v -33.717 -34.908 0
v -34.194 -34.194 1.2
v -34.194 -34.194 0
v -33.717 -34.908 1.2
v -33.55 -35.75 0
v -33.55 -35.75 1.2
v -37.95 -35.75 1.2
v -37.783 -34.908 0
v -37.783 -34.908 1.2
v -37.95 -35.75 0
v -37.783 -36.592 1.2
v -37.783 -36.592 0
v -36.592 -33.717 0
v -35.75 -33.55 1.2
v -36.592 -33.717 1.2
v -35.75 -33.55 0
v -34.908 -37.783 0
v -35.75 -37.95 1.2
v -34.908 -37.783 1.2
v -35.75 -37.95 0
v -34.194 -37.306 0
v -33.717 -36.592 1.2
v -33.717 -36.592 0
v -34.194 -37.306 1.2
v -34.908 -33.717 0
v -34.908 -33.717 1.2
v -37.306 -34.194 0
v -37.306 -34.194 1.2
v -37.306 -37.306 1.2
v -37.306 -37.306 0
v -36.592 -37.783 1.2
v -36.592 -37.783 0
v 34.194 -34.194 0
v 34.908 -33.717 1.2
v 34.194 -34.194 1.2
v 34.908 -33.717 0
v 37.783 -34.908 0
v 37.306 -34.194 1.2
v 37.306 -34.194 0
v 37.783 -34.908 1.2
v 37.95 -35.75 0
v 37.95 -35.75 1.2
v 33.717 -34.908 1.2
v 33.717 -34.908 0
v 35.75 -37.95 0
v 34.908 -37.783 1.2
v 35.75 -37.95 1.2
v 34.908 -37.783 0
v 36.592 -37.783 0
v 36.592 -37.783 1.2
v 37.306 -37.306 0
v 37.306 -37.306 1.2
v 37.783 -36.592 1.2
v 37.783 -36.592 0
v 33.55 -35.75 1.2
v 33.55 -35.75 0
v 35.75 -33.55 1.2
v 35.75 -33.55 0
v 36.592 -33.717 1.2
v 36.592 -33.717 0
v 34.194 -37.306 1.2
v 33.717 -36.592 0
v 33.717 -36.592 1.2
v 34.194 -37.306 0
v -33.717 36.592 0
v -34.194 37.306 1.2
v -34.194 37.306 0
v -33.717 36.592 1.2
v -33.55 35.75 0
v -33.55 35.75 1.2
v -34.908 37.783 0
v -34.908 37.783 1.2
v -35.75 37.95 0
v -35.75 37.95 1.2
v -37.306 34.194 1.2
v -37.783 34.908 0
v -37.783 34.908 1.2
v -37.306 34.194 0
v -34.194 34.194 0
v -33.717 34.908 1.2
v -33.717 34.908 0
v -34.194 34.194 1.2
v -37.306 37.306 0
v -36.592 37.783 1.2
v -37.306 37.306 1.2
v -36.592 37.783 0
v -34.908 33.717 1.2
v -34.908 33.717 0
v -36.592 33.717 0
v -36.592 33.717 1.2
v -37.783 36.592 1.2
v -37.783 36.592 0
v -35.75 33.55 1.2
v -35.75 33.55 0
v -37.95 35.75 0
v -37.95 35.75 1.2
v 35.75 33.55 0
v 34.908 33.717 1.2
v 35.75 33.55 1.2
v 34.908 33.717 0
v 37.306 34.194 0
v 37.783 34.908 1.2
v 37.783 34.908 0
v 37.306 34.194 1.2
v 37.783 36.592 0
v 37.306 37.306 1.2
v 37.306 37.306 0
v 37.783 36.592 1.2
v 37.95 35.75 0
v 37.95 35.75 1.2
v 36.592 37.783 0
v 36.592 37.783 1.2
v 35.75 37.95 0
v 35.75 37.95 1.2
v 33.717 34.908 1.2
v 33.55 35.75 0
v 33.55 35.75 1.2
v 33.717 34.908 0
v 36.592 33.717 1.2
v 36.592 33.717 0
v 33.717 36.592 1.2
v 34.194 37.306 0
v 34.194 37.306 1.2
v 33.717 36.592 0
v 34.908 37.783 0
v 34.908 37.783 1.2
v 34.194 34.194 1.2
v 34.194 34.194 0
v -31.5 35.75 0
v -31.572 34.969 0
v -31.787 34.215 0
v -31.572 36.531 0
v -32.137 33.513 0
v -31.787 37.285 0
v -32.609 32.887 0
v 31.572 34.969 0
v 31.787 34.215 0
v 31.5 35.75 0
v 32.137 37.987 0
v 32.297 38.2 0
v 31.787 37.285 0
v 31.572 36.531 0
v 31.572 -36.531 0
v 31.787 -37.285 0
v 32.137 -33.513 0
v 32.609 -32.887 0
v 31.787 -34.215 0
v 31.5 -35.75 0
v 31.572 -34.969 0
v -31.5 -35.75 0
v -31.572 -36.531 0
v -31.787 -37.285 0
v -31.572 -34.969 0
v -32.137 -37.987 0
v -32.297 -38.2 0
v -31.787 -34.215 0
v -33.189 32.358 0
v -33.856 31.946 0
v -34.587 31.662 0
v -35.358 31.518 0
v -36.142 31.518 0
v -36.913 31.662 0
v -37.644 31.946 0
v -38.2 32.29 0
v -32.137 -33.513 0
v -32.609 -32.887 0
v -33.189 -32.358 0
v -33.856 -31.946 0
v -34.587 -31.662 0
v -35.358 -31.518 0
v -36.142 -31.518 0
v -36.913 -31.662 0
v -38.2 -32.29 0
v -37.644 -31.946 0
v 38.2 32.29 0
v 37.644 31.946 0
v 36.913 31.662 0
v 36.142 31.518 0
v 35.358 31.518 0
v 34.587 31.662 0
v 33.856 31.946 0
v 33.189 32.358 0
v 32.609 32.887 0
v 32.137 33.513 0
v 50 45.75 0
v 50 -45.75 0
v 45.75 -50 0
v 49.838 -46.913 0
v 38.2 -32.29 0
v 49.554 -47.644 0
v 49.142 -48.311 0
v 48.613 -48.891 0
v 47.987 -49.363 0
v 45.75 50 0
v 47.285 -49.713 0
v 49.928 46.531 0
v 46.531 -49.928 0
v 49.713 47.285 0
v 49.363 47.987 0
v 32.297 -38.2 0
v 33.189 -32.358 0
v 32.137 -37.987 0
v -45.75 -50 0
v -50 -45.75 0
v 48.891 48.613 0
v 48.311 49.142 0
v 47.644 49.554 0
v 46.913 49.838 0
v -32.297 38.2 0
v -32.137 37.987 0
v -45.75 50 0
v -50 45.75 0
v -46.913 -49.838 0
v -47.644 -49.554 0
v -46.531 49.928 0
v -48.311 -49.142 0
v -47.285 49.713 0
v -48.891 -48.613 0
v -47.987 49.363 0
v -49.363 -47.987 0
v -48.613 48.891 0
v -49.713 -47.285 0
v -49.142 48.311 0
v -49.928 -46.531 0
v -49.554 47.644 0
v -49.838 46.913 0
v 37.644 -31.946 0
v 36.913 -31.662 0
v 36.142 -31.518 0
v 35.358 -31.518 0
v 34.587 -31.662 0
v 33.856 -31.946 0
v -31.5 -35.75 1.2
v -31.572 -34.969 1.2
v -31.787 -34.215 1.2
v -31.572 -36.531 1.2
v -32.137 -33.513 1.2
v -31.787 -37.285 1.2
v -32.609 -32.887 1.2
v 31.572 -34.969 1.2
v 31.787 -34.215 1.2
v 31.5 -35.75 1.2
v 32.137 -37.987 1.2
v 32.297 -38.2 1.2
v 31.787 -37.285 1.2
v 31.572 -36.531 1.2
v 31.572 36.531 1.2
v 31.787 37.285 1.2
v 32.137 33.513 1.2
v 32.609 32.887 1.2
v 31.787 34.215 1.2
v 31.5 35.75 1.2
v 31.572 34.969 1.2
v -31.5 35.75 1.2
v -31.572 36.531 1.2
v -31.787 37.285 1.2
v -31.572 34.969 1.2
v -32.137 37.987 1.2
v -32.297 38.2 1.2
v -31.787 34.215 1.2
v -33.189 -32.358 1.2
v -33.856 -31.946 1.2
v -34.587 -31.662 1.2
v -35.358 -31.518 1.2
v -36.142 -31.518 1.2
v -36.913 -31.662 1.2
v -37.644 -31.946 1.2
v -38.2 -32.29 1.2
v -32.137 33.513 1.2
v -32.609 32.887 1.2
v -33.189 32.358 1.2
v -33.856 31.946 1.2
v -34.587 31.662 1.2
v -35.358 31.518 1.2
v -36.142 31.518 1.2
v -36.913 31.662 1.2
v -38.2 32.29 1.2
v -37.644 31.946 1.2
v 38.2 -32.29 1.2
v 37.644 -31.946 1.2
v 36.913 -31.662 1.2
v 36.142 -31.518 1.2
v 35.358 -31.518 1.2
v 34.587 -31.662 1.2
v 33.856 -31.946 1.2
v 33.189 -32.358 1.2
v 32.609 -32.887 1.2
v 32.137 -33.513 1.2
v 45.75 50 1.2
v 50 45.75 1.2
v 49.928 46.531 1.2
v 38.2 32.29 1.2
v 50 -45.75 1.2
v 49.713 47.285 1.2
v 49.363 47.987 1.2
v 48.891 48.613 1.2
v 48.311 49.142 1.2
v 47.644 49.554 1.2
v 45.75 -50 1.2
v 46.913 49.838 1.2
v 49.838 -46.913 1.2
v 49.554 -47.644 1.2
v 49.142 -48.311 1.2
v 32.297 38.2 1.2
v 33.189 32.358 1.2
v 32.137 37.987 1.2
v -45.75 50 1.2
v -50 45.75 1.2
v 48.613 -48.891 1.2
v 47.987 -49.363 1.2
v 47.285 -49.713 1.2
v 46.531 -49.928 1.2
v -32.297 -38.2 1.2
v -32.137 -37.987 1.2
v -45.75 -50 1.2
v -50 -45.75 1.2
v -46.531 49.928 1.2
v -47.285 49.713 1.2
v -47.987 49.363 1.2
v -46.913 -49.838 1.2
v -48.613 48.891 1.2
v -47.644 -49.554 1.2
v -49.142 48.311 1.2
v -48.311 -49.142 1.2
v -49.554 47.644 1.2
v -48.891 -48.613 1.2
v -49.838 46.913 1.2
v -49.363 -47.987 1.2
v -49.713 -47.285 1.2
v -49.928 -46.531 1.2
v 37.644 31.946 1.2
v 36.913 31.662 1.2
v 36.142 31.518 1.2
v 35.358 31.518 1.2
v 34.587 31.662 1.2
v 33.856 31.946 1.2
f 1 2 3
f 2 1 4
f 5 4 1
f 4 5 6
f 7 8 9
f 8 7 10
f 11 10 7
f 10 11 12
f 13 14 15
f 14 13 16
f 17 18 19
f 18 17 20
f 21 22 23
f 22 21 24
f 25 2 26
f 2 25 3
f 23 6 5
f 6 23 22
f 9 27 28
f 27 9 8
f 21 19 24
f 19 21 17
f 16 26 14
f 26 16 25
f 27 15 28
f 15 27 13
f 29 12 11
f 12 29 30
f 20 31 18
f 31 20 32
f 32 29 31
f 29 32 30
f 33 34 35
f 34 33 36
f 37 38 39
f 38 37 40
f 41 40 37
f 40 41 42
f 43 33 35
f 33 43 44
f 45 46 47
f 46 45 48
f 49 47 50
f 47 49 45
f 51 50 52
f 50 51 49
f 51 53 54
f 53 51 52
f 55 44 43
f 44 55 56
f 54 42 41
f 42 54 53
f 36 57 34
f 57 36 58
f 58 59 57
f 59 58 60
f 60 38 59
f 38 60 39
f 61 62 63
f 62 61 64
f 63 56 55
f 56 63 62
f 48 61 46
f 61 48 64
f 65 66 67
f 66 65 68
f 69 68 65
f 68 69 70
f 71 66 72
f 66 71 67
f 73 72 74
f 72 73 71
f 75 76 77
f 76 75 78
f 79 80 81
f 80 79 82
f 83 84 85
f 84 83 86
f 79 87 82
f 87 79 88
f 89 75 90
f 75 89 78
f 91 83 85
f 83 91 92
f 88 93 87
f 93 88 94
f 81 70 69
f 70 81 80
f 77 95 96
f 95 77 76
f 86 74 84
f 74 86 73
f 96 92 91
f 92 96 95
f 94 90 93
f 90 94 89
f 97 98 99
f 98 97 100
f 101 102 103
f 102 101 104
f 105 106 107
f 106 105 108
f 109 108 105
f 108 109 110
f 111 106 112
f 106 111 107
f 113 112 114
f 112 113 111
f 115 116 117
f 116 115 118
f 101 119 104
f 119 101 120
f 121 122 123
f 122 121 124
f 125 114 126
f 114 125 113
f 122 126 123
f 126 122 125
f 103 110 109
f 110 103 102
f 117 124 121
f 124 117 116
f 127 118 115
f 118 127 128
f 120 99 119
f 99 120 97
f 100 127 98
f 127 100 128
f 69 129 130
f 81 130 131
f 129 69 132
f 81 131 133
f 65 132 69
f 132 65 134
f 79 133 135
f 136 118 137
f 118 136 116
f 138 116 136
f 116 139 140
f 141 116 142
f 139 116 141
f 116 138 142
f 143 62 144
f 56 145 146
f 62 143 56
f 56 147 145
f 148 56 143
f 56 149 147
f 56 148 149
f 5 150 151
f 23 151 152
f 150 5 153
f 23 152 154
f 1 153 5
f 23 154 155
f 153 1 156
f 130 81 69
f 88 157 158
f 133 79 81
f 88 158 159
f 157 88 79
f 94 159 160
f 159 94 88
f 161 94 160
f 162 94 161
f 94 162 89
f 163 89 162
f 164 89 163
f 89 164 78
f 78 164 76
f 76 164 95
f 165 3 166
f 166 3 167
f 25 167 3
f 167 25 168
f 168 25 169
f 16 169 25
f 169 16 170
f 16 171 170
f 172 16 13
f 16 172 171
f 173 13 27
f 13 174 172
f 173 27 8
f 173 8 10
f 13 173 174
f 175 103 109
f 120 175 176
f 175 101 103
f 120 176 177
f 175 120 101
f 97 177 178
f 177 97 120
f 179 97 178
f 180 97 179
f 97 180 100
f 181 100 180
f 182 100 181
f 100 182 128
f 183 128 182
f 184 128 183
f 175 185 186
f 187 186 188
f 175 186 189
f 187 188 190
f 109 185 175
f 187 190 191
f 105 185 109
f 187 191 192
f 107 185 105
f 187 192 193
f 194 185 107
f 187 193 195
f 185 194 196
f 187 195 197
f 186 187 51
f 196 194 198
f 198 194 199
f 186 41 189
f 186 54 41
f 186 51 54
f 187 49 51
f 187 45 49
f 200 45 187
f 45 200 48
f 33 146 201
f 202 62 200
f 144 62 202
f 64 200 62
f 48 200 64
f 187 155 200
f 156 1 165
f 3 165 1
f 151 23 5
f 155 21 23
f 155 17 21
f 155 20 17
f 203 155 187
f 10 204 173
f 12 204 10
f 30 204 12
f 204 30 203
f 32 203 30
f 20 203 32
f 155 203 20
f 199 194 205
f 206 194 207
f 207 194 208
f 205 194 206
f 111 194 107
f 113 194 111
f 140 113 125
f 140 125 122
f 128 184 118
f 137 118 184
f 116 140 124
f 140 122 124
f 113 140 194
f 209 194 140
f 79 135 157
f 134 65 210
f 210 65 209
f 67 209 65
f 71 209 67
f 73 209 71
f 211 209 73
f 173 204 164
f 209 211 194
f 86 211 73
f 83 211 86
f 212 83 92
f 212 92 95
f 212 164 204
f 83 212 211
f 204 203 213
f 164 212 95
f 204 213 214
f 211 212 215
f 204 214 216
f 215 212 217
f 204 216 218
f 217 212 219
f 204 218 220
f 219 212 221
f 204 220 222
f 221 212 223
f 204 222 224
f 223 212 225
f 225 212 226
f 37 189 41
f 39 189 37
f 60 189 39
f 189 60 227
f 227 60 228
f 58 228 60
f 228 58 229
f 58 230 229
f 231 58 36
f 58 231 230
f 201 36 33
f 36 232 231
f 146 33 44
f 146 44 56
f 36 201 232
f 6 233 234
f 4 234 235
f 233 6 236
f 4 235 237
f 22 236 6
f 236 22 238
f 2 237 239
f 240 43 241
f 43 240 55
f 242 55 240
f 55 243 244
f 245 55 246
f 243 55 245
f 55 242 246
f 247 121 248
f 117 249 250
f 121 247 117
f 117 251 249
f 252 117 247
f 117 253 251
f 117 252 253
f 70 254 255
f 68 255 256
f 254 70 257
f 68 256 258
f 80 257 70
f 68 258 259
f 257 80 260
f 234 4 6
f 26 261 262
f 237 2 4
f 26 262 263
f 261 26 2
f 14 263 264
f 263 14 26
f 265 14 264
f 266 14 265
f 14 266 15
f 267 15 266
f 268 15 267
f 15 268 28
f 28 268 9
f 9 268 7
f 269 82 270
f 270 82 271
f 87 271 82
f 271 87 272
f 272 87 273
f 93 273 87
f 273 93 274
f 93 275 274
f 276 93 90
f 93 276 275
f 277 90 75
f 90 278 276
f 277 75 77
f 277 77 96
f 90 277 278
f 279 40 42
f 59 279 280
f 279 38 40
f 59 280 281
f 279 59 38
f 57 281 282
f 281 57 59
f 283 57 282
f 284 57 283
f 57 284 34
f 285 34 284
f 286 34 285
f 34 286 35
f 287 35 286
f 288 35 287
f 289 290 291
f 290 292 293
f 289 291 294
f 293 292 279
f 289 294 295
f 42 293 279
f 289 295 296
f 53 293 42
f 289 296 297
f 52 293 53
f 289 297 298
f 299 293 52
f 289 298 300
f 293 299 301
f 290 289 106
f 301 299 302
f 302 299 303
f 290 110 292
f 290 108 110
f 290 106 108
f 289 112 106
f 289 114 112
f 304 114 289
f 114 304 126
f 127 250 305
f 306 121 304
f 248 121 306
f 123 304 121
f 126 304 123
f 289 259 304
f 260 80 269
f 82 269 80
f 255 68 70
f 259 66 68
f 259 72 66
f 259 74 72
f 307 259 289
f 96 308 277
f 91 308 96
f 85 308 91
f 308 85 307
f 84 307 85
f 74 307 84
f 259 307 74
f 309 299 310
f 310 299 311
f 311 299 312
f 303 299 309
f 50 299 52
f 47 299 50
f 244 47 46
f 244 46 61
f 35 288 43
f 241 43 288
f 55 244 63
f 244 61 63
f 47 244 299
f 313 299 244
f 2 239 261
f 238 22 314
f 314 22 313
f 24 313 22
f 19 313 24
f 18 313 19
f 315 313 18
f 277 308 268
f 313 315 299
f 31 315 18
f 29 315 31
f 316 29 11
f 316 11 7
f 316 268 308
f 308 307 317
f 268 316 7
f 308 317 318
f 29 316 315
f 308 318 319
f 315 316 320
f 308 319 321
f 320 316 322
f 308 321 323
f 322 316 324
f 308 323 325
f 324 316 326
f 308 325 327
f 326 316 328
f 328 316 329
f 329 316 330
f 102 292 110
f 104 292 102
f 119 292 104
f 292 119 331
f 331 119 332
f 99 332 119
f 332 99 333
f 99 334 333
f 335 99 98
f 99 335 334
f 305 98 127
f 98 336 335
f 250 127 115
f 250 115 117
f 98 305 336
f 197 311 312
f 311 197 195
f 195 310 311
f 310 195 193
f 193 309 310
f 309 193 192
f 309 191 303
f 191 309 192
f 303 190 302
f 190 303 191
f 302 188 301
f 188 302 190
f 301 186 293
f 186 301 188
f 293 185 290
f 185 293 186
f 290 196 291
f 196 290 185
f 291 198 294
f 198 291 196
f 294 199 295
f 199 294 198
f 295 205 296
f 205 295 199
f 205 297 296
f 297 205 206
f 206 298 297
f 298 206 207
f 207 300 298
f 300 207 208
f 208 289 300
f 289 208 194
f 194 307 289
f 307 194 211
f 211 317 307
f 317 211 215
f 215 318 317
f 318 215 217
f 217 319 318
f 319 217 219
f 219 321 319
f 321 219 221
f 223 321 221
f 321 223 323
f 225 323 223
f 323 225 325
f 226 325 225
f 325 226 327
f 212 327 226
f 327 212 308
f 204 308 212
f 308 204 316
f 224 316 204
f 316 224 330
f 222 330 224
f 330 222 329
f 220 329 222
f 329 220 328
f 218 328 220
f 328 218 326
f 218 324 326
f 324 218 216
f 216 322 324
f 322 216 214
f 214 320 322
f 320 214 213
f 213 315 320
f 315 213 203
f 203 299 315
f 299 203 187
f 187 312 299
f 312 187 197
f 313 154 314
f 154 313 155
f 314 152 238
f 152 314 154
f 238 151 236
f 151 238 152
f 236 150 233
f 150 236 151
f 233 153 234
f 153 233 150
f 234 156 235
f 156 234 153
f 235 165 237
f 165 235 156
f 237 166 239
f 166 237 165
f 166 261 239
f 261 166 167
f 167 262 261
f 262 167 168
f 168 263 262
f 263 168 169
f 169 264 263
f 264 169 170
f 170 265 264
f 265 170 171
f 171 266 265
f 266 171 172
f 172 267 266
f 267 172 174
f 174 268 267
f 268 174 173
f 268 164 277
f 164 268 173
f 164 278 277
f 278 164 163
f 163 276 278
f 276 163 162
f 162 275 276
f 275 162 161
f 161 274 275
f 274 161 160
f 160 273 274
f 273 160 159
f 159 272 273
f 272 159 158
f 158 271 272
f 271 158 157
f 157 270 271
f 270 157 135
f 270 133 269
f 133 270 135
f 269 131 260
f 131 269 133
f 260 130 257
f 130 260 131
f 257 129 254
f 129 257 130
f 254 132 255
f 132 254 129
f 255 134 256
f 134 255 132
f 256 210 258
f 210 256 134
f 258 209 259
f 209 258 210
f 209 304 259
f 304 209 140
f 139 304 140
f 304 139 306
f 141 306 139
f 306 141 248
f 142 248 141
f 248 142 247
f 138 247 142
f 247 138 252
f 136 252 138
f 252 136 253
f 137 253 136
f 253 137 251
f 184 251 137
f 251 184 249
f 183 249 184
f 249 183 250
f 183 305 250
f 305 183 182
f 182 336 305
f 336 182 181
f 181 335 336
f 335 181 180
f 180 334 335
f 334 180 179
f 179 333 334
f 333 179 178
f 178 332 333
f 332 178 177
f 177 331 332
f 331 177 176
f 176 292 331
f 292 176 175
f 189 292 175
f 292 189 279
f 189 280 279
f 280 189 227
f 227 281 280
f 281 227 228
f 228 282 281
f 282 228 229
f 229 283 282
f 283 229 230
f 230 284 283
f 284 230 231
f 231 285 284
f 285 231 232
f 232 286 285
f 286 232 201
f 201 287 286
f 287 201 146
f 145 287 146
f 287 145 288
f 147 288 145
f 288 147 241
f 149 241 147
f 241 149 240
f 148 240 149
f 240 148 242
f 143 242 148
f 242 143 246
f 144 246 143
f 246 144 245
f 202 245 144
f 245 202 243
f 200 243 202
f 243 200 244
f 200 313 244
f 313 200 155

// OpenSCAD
/*
 * Customizable Fan Cover - https://www.thingiverse.com/thing:2802474
 * by Dennis Hofmann - https://www.thingiverse.com/mightynozzle/about
 * created 2018-02-22
 * updated 2018-03-27
 * version v1.2
 *
 * Changelog
 * --------------
 * v1.2:
 *      - better quality of rounded corners and crosshair pattern
 * v1.1:
 *      - added support line option for crosshair and square pattern
 * v1.0:
 *      - final design
 * --------------
 *
 * This work is licensed under the Creative Commons - Attribution - Non-Commercial - ShareAlike license.
 * https://creativecommons.org/licenses/by-nc-sa/3.0/
 */


 // Parameter Section //
//-------------------//

/* [Global Settings] */

// Choose between presets of known and common fan sizes.
fan_preset = "custom"; //[25:25mm,30:30mm,40:40mm,50:50mm,60:60mm,70:70mm,80:80mm,92:92mm,120:120mm,140:140mm,custom:Custom Fan Settings]

// If you want save to save about 40% filament and about 20% printing time, you can choose the reduced frame option.
frame_option = "reduced"; //[full,reduced]

// Minimum Border Size. I recommend to use two/four/six... times of your line width setting of your slicer. Simplify3D uses 0.48mm line width by default if you are using a 0.4mm nozzle. Cura uses 0.4mm line width.
min_border_size_in_millimeter = 1.8;

// Choose between a grill pattern
grill_pattern = "honeycomb"; //[honeycomb,grid,line,triangle,crosshair,square,dot,aperture]

// Set the angle of the pattern around the center of the cover.
grill_pattern_rotation = 0; //[0:5:360]

// Size of the pattern lines. I recommend to use two/four/six... times of your line width setting of your slicer. Simplify3D uses 0.48mm line width by default if you are using a 0.4mm nozzle. Cura uses 0.4mm line width.
line_size_in_millimter = 0.9; //[0.3:0.02:4]

// Space between two lines of your pattern. If you choose aperture pattern, this value set the size of the center octagon.
line_space_in_millimeter = 200; //[1:0.1:50]

// If you need countersunk holes, you can activate it here. Bottom = first layer. Top = last layer. 
screw_hole_chamfer = "no"; //[no,top,bottom,top_and_bottom]

// Activate or deactivate rounded corners. The radius will be automatically calculated.
rounded_corners = "yes"; //[yes,no]

// number of straight lines supporting the crosshair or square pattern.
number_of_support_lines = 2;  //[1:1:36]

/* [Custom Fan Settings] */

// Cover size. E.g. 80 for a 80mm Fan
cover_size_in_millimeter = 80;

// E.g. 2.9 for M2.5, 3.3 for M3, 4.4 for M4
screw_hole_diameter_in_millimeter = 4.4;

// 25mm fan: 20 | 30mm fan: 24 | 40mm fan: 32 | 50mm fan: 40 | 60mm fan: 50 | 70mm fan: 61.5 | 80mm fan: 71.5 | 92mm fan: 82.5 | 120mm fan: 105 | 140mm fan: 126 
screw_hole_distance_in_millimeter = 71.5;

// Height of the outer frame of the cover
cover_height_in_millimeter = 1.2;

// Height of the pattern inside the cover frame
grill_pattern_height_in_millimeter = 1.2;

// Additional border around the cover
additional_border_in_millimeter = 10;

/* [Hidden] */
min_border_size = min_border_size_in_millimeter;
line_size = line_size_in_millimter;
line_space = line_space_in_millimeter;

 // Program Section //
//-----------------//

if(fan_preset == "25") {
    fan_cover(cover_size = 25, screw_hole_dia = 2.9, screw_hole_distance = 20, cover_h = 2, grill_pattern_h = 1);
}
if(fan_preset == "30") {
    fan_cover(cover_size = 30, screw_hole_dia = 3.3, screw_hole_distance = 24, cover_h = 2.5, grill_pattern_h = 1.1);
}
if(fan_preset == "40") {
    fan_cover(cover_size = 40, screw_hole_dia = 3.3, screw_hole_distance = 32, cover_h = 2.7, grill_pattern_h = 1.2);
}
if(fan_preset == "50") {
    fan_cover(cover_size = 50, screw_hole_dia = 4.4, screw_hole_distance = 40, cover_h = 2.9, grill_pattern_h = 1.3);
}
if(fan_preset == "60") {
    fan_cover(cover_size = 60, screw_hole_dia = 4.4, screw_hole_distance = 50, cover_h = 3, grill_pattern_h = 1.3);
}
if(fan_preset == "70") {
    fan_cover(cover_size = 70, screw_hole_dia = 4.4, screw_hole_distance = 61.5, cover_h = 3, grill_pattern_h = 1.4);
}
if(fan_preset == "80") {
    fan_cover(cover_size = 80, screw_hole_dia = 4.4, screw_hole_distance = 71.5, cover_h = 3.2, grill_pattern_h = 1.5);
}
if(fan_preset == "92") {
    fan_cover(cover_size = 92, screw_hole_dia = 4.4, screw_hole_distance = 82.5, cover_h = 3.5, grill_pattern_h = 1.6);
}
if(fan_preset == "120") {
    fan_cover(cover_size = 120, screw_hole_dia = 4.4, screw_hole_distance = 105, cover_h = 4, grill_pattern_h = 1.8);
}
if(fan_preset == "140") {
    fan_cover(cover_size = 140, screw_hole_dia = 4.4, screw_hole_distance = 126, cover_h = 4.5, grill_pattern_h = 2.0);
}
if(fan_preset == "custom") {
    fan_cover(cover_size = cover_size_in_millimeter, screw_hole_dia = screw_hole_diameter_in_millimeter, screw_hole_distance = screw_hole_distance_in_millimeter, cover_h = cover_height_in_millimeter, grill_pattern_h = grill_pattern_height_in_millimeter);
}


 // Module Section //
//----------------//

module fan_cover(cover_size, screw_hole_dia, screw_hole_distance, cover_h, grill_pattern_h) {
    corner_size = cover_size - screw_hole_distance;
    corner_r = rounded_corners == "yes" ? corner_size / 2 : 0;
    screw_pos = (cover_size - corner_size) / 2;
    color("DodgerBlue") difference() {
        union() {
            linear_extrude(height = cover_h, convexity = 20) {
                difference() {
                    offset(r=corner_r, $fn = ceil(corner_r * 8)) {
                        offset(r=-corner_r) {
                            square([cover_size + 2*additional_border_in_millimeter, cover_size + 2*additional_border_in_millimeter], center = true);
                        }
                    }
                    if(frame_option == "reduced") {
                        offset(r=corner_r, $fn = ceil(corner_r * 8)) {
                            offset(r=-corner_r) {
                                square([cover_size - min_border_size*2, cover_size - min_border_size*2], center = true);
                            }
                        }
                    }
                    if(frame_option == "full") {
                        circle(d = cover_size - min_border_size * 2, $fn = cover_size);
                    }
                } 
                if(frame_option == "reduced") {
                    for(y = [-1:2:1]) {
                        for(x = [-1:2:1]) {
                            translate([screw_pos * x, screw_pos * y, -2]) {
                                circle(d = corner_size, $fn = ceil(corner_r * 8));
                            }
                        }
                    }
                }
            }
            linear_extrude(height = grill_pattern_h, convexity = 20) {
                intersection() {
                    offset(r=corner_r, $fn = ceil(corner_r * 8)) {
                        offset(r=-corner_r) {
                            square([cover_size, cover_size], center = true);
                        }
                    }
                    rotate(grill_pattern_rotation) {
                        if(grill_pattern == "honeycomb") {
                            honeycomb_pattern(cover_size, line_size, line_space);
                        }
                        if(grill_pattern == "grid") {
                            grid_pattern(cover_size, line_size, line_space);
                        }
                        if(grill_pattern == "line") {
                            line_pattern(cover_size, line_size, line_space);
                        }
                        if(grill_pattern == "triangle") {
                            triangle_pattern(cover_size, line_size, line_space);
                        }
                        if(grill_pattern == "crosshair") {
                            crosshair_pattern(cover_size, line_size, line_space);
                        }
                        if(grill_pattern == "square") {
                            square_pattern(cover_size, line_size, line_space);
                        }
                        if(grill_pattern == "dot") {
                            dot_pattern(cover_size, line_size, line_space);
                        }
                        if(grill_pattern == "aperture") {
                            aperture_pattern(cover_size, line_size, line_space);
                        }
                        
                    }
                }
            }
        }
        for(y = [-1:2:1]) {
            for(x = [-1:2:1]) {
                translate([screw_pos * x, screw_pos * y, -2]) {
                    screw_hole(cover_h, screw_hole_dia);
                }
            }
        }
    }
}

module screw_hole(cover_h, screw_hole_dia) {
    cylinder(h = cover_h + 4, d = screw_hole_dia, $fn = 16);
    if(screw_hole_chamfer == "bottom" || screw_hole_chamfer == "top_and_bottom") {
        translate([0, 0, 2.9 - screw_hole_dia]) {
            cylinder(h = screw_hole_dia, d1 = screw_hole_dia * 4, d2 = screw_hole_dia);
        }
    }
    if(screw_hole_chamfer == "top" || screw_hole_chamfer == "top_and_bottom") {
        translate([0, 0, cover_h + screw_hole_dia/4]) {
            cylinder(h = screw_hole_dia, d2 = screw_hole_dia * 4, d1 = screw_hole_dia);
        }
    }
}

module grid_pattern(size, line_size, line_space) {
    num = ceil(size / (line_size + line_space) * 1.42);
    for(x = [floor(-num / 2) : ceil(num / 2)]) {
        translate([x * (line_size + line_space), 0]) {
            square([line_size, num *(line_size + line_space)], center=true);
        }
        rotate(90) {
            translate([x * (line_size + line_space), 0]) {
                square([line_size, num *(line_size + line_space)], center = true);
            }
        }
    }
}

module triangle_pattern(size, line_size, line_space) {
    num = ceil(size / (line_size + line_space) * 1.42);
    for(x = [floor(-num / 2):ceil(num / 2)]) {
        translate([x * (line_size + line_space), 0]) {
            square([line_size, num *(line_size + line_space)], center = true);
        }
        rotate(60) {
            translate([x * (line_size + line_space), 0]) {
                square([line_size, num *(line_size + line_space)], center = true);
            }
        }
        rotate(120) {
            translate([x * (line_size + line_space), 0]) {
                square([line_size, num *(line_size + line_space)], center = true);
            }
        }
    }
}

module line_pattern(size, line_size, line_space) {
    num = ceil(size / (line_size + line_space)*1.42);
    for(x = [floor(-num / 2):ceil(num / 2)]) {
        translate([x * (line_size + line_space), 0]) {
            square([line_size, num *(line_size + line_space)], center=true);
        }
    }
}

module crosshair_pattern(size, line_size, line_space) {
    line = (line_size + line_space) * 2;
    num = ceil(size / line * 1.42);
    for(n = [1:num]) {
        difference() {
            circle(d = n * line + line_size * 2, $fn = ceil(n * line + line_size * 2));
            circle(d = n * line, $fn = ceil(n * line + line_size * 2));
        }
    }
    for(rot=[0:90 / number_of_support_lines * 2:180]) {
        rotate(rot + 45) square([size * 2, line_size], center = true);
    }
}

module square_pattern(size, line_size, line_space) {
    line = (line_size + line_space) * 2;
    num = ceil(size / line * 1.42); 
    for(n = [1:num]) {
        difference() {
            square([n * line + line_size * 2, n * line + line_size * 2], center = true);
            square([n * line, n * line], center = true);
        }
    }
    for(rot=[0:90 / number_of_support_lines * 2:180]) {
        rotate(rot + 45) square([size * 2, line_size], center = true);
    }
}

module honeycomb_pattern(size, line_size, line_space) {
    min_rad = (line_space / 2 * sqrt(3)) / 2 + line_size / 2;
    y_offset = sqrt(min_rad * min_rad * 4 - min_rad * min_rad);
    num_x = ceil(size / min_rad / 2) * 1.42;
    num_y = ceil(size / y_offset) * 1.42;
    difference() {
        square([size * 1.42, size * 1.42], center = true);
        for(y = [floor(-num_y / 2) : ceil(num_y / 2)]) {
            odd = (y % 2 == 0) ? 0 : min_rad;
            for(x = [floor(-num_x / 2) : ceil(num_x / 2)]) {
                translate([x * min_rad * 2 + odd, y * y_offset]) {
                    rotate(30) {
                        circle(d=line_space, $fn=6);
                    }
                }
            }
        }
    }
}

module dot_pattern(size, line_size, line_space) {
    rad = line_space / 2;
    y_offset = sqrt((rad + line_size / 2) * (rad + line_size / 2) * 4 - (rad + line_size / 2) * (rad + line_size / 2));
    num_x = ceil(size / rad / 2) * 1.42;
    num_y = ceil(size / y_offset) * 1.42;
    difference() {
        square([size * 1.42, size * 1.42], center = true);
        for(y = [floor(-num_y / 2) : ceil(num_y / 2)]) {
            odd = (y % 2 == 0) ? 0 : rad + line_size / 2;
            for(x = [floor(-num_x / 2) : ceil(num_x / 2)]) {
                translate([x * (rad + line_size / 2) * 2 + odd, y * y_offset]) {
                    rotate(30) {
                        circle(d=line_space);
                    }
                }
            }
        }
    }
}

module aperture_pattern(size, line_size, line_space) {
    circle(d = line_space, $fn = 8);
    for(rot = [1:2:15]) {
        rotate(360 / 16 * rot) {
            translate([line_space / 2 * cos(360 / 16) - line_size, -line_size]) {
                square([line_size, size]);
            }
        }
    }
}
